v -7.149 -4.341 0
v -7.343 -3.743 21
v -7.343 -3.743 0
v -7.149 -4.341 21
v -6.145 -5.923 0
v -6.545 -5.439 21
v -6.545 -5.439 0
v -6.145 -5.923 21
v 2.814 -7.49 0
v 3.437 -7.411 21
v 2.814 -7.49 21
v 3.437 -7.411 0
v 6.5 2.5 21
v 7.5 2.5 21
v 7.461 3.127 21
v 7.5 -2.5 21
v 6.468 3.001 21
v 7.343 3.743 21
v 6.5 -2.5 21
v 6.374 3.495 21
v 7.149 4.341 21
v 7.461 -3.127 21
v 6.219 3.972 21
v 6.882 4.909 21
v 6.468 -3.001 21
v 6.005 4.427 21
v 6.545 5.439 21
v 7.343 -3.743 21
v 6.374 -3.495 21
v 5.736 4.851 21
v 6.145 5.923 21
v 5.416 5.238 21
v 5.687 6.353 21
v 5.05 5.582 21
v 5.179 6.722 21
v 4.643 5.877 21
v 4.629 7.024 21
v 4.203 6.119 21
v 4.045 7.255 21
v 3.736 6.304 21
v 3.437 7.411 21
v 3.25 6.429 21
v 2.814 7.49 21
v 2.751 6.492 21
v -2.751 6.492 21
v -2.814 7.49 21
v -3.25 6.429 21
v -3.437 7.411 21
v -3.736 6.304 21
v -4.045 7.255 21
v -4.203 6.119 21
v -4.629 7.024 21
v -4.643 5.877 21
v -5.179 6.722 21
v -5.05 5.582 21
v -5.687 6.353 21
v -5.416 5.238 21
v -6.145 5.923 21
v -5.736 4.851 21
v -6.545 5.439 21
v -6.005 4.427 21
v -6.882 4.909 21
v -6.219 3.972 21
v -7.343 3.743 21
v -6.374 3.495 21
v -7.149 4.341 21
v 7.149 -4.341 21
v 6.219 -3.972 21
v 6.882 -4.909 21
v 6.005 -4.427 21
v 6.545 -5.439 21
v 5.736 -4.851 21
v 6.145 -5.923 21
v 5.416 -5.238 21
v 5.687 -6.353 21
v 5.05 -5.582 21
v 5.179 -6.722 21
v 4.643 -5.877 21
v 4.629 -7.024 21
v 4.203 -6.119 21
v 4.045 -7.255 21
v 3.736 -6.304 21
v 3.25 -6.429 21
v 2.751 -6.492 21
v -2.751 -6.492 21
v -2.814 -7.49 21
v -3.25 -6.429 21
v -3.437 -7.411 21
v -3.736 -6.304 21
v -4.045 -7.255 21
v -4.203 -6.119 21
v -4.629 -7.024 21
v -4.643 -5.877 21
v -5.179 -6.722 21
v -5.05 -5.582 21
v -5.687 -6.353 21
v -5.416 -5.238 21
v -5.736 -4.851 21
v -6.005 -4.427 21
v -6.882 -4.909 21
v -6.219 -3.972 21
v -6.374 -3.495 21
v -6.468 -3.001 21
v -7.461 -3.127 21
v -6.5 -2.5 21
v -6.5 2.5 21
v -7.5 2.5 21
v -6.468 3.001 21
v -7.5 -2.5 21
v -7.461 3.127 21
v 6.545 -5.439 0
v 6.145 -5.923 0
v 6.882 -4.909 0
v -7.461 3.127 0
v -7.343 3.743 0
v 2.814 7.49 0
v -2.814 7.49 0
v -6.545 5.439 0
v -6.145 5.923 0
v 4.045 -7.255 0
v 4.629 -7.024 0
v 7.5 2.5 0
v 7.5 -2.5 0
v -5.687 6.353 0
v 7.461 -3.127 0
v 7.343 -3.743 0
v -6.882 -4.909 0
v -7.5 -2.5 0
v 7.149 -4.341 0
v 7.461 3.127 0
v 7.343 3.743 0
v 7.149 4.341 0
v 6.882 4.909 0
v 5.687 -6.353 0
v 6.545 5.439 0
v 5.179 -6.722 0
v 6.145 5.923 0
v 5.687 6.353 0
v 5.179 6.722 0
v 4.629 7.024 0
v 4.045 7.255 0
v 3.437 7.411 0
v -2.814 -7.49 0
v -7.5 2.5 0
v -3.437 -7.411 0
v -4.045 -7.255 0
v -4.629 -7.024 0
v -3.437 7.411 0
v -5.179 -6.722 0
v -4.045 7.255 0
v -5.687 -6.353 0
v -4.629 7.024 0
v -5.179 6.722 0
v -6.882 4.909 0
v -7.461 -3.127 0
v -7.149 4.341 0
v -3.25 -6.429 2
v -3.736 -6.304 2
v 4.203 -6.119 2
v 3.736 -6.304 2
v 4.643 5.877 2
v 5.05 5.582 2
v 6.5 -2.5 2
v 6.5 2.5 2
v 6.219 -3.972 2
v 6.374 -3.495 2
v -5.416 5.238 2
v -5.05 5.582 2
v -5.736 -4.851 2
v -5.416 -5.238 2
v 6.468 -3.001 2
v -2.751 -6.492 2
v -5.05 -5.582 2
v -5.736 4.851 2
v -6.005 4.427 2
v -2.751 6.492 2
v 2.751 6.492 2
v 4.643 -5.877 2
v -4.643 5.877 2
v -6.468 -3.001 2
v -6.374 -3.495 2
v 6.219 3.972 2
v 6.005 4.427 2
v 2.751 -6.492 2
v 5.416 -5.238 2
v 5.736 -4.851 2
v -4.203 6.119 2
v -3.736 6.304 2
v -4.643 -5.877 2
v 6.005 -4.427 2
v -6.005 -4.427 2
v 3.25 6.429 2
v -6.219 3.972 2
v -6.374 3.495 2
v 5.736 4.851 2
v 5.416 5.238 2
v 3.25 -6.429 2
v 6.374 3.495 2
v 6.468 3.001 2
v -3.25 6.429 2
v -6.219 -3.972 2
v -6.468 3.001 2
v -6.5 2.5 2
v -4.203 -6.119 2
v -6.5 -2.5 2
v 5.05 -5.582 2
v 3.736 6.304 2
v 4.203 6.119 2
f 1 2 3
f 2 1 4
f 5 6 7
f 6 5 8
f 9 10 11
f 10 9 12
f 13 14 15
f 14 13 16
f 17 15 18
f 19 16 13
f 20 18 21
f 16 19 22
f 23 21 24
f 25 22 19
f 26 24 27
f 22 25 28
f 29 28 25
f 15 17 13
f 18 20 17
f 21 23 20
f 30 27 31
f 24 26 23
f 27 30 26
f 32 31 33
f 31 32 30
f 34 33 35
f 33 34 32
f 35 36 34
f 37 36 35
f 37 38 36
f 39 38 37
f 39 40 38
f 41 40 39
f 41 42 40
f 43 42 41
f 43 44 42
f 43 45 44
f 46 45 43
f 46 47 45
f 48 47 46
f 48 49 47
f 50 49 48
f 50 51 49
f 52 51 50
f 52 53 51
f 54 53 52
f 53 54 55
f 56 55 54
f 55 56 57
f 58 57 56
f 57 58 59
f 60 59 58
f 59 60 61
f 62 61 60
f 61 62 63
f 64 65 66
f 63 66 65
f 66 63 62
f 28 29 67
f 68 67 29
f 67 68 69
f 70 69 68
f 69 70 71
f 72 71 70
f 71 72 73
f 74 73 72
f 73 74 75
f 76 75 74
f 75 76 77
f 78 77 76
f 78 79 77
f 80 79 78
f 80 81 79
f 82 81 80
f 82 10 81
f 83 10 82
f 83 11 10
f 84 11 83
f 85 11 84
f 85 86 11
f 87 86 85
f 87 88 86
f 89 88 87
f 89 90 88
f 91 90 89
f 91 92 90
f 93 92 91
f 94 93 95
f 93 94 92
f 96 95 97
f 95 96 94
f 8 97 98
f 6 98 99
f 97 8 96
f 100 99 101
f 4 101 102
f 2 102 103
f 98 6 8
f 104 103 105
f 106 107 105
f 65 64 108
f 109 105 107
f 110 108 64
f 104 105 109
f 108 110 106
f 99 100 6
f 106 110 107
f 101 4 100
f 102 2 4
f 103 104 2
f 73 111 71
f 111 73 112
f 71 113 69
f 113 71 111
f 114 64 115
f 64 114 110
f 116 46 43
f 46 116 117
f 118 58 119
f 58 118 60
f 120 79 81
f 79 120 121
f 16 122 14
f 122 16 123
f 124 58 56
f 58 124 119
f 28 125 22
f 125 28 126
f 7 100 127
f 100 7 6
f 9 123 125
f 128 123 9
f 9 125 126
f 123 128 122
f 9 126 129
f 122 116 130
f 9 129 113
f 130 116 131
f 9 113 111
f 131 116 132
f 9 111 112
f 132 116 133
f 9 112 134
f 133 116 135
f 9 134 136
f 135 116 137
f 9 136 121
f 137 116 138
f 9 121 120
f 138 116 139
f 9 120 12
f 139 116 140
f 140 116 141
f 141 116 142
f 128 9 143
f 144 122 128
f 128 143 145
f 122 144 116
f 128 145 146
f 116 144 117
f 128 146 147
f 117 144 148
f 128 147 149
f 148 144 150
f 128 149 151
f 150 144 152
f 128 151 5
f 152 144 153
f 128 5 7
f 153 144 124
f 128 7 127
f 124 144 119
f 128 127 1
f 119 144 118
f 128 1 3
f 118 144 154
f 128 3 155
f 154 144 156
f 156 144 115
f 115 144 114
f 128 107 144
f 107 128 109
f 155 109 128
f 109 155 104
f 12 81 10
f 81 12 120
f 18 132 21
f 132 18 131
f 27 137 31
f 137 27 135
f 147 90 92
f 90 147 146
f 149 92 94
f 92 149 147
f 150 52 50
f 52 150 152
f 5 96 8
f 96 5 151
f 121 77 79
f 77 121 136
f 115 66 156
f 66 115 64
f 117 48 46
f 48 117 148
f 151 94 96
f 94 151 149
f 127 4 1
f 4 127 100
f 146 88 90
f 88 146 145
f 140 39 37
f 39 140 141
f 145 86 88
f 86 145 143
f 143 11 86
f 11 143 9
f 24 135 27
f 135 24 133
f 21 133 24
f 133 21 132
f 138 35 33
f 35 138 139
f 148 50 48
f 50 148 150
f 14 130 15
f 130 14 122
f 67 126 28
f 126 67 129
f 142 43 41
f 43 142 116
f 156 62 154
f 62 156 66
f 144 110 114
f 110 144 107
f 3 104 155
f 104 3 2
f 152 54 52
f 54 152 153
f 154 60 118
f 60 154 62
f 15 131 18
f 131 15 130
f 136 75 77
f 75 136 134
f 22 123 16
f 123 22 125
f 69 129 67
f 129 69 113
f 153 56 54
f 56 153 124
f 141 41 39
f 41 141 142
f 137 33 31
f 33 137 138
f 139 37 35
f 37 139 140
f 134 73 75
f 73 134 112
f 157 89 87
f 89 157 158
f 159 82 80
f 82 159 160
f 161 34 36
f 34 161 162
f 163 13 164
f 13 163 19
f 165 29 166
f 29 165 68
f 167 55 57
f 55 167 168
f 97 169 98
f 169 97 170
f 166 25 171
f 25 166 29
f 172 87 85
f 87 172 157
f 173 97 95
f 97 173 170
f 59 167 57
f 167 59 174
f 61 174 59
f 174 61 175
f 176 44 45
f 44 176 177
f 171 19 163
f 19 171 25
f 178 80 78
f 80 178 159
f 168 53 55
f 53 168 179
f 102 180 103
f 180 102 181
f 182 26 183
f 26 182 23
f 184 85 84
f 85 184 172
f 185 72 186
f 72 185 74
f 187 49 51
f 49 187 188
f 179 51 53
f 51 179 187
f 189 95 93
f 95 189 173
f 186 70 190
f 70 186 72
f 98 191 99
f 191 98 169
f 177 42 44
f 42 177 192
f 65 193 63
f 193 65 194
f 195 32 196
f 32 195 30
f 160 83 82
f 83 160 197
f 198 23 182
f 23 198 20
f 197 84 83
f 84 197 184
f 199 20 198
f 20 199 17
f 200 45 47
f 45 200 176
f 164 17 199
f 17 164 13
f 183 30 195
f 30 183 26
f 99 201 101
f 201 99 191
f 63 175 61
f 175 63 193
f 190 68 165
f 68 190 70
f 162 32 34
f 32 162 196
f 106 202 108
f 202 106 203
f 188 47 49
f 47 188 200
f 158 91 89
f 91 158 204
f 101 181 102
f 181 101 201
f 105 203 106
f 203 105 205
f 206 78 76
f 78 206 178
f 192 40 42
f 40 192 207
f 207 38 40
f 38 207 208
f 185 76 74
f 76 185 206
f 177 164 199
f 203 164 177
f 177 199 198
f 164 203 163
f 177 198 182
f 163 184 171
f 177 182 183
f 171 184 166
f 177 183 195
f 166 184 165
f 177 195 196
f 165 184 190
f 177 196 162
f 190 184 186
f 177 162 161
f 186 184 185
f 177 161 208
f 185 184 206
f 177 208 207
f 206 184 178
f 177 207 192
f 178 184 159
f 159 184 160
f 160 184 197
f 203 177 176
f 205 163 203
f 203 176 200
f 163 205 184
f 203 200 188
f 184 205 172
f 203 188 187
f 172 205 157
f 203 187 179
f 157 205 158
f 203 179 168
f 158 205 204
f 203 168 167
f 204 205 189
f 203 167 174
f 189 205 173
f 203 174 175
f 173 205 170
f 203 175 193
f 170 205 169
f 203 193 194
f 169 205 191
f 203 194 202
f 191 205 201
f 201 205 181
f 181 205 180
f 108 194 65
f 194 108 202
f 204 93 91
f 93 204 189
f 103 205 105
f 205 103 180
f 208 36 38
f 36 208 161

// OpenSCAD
$fn = 50;


difference() {
	union() {
		hull() {
			translate(v = [-2.5000000000, 2.5000000000, 0]) {
				cylinder(h = 21, r = 5);
			}
			translate(v = [2.5000000000, 2.5000000000, 0]) {
				cylinder(h = 21, r = 5);
			}
			translate(v = [-2.5000000000, -2.5000000000, 0]) {
				cylinder(h = 21, r = 5);
			}
			translate(v = [2.5000000000, -2.5000000000, 0]) {
				cylinder(h = 21, r = 5);
			}
		}
	}
	union() {
		translate(v = [0, 0, 2]) {
			hull() {
				translate(v = [-2.5000000000, 2.5000000000, 0]) {
					cylinder(h = 19, r = 4);
				}
				translate(v = [2.5000000000, 2.5000000000, 0]) {
					cylinder(h = 19, r = 4);
				}
				translate(v = [-2.5000000000, -2.5000000000, 0]) {
					cylinder(h = 19, r = 4);
				}
				translate(v = [2.5000000000, -2.5000000000, 0]) {
					cylinder(h = 19, r = 4);
				}
			}
		}
	}
}
